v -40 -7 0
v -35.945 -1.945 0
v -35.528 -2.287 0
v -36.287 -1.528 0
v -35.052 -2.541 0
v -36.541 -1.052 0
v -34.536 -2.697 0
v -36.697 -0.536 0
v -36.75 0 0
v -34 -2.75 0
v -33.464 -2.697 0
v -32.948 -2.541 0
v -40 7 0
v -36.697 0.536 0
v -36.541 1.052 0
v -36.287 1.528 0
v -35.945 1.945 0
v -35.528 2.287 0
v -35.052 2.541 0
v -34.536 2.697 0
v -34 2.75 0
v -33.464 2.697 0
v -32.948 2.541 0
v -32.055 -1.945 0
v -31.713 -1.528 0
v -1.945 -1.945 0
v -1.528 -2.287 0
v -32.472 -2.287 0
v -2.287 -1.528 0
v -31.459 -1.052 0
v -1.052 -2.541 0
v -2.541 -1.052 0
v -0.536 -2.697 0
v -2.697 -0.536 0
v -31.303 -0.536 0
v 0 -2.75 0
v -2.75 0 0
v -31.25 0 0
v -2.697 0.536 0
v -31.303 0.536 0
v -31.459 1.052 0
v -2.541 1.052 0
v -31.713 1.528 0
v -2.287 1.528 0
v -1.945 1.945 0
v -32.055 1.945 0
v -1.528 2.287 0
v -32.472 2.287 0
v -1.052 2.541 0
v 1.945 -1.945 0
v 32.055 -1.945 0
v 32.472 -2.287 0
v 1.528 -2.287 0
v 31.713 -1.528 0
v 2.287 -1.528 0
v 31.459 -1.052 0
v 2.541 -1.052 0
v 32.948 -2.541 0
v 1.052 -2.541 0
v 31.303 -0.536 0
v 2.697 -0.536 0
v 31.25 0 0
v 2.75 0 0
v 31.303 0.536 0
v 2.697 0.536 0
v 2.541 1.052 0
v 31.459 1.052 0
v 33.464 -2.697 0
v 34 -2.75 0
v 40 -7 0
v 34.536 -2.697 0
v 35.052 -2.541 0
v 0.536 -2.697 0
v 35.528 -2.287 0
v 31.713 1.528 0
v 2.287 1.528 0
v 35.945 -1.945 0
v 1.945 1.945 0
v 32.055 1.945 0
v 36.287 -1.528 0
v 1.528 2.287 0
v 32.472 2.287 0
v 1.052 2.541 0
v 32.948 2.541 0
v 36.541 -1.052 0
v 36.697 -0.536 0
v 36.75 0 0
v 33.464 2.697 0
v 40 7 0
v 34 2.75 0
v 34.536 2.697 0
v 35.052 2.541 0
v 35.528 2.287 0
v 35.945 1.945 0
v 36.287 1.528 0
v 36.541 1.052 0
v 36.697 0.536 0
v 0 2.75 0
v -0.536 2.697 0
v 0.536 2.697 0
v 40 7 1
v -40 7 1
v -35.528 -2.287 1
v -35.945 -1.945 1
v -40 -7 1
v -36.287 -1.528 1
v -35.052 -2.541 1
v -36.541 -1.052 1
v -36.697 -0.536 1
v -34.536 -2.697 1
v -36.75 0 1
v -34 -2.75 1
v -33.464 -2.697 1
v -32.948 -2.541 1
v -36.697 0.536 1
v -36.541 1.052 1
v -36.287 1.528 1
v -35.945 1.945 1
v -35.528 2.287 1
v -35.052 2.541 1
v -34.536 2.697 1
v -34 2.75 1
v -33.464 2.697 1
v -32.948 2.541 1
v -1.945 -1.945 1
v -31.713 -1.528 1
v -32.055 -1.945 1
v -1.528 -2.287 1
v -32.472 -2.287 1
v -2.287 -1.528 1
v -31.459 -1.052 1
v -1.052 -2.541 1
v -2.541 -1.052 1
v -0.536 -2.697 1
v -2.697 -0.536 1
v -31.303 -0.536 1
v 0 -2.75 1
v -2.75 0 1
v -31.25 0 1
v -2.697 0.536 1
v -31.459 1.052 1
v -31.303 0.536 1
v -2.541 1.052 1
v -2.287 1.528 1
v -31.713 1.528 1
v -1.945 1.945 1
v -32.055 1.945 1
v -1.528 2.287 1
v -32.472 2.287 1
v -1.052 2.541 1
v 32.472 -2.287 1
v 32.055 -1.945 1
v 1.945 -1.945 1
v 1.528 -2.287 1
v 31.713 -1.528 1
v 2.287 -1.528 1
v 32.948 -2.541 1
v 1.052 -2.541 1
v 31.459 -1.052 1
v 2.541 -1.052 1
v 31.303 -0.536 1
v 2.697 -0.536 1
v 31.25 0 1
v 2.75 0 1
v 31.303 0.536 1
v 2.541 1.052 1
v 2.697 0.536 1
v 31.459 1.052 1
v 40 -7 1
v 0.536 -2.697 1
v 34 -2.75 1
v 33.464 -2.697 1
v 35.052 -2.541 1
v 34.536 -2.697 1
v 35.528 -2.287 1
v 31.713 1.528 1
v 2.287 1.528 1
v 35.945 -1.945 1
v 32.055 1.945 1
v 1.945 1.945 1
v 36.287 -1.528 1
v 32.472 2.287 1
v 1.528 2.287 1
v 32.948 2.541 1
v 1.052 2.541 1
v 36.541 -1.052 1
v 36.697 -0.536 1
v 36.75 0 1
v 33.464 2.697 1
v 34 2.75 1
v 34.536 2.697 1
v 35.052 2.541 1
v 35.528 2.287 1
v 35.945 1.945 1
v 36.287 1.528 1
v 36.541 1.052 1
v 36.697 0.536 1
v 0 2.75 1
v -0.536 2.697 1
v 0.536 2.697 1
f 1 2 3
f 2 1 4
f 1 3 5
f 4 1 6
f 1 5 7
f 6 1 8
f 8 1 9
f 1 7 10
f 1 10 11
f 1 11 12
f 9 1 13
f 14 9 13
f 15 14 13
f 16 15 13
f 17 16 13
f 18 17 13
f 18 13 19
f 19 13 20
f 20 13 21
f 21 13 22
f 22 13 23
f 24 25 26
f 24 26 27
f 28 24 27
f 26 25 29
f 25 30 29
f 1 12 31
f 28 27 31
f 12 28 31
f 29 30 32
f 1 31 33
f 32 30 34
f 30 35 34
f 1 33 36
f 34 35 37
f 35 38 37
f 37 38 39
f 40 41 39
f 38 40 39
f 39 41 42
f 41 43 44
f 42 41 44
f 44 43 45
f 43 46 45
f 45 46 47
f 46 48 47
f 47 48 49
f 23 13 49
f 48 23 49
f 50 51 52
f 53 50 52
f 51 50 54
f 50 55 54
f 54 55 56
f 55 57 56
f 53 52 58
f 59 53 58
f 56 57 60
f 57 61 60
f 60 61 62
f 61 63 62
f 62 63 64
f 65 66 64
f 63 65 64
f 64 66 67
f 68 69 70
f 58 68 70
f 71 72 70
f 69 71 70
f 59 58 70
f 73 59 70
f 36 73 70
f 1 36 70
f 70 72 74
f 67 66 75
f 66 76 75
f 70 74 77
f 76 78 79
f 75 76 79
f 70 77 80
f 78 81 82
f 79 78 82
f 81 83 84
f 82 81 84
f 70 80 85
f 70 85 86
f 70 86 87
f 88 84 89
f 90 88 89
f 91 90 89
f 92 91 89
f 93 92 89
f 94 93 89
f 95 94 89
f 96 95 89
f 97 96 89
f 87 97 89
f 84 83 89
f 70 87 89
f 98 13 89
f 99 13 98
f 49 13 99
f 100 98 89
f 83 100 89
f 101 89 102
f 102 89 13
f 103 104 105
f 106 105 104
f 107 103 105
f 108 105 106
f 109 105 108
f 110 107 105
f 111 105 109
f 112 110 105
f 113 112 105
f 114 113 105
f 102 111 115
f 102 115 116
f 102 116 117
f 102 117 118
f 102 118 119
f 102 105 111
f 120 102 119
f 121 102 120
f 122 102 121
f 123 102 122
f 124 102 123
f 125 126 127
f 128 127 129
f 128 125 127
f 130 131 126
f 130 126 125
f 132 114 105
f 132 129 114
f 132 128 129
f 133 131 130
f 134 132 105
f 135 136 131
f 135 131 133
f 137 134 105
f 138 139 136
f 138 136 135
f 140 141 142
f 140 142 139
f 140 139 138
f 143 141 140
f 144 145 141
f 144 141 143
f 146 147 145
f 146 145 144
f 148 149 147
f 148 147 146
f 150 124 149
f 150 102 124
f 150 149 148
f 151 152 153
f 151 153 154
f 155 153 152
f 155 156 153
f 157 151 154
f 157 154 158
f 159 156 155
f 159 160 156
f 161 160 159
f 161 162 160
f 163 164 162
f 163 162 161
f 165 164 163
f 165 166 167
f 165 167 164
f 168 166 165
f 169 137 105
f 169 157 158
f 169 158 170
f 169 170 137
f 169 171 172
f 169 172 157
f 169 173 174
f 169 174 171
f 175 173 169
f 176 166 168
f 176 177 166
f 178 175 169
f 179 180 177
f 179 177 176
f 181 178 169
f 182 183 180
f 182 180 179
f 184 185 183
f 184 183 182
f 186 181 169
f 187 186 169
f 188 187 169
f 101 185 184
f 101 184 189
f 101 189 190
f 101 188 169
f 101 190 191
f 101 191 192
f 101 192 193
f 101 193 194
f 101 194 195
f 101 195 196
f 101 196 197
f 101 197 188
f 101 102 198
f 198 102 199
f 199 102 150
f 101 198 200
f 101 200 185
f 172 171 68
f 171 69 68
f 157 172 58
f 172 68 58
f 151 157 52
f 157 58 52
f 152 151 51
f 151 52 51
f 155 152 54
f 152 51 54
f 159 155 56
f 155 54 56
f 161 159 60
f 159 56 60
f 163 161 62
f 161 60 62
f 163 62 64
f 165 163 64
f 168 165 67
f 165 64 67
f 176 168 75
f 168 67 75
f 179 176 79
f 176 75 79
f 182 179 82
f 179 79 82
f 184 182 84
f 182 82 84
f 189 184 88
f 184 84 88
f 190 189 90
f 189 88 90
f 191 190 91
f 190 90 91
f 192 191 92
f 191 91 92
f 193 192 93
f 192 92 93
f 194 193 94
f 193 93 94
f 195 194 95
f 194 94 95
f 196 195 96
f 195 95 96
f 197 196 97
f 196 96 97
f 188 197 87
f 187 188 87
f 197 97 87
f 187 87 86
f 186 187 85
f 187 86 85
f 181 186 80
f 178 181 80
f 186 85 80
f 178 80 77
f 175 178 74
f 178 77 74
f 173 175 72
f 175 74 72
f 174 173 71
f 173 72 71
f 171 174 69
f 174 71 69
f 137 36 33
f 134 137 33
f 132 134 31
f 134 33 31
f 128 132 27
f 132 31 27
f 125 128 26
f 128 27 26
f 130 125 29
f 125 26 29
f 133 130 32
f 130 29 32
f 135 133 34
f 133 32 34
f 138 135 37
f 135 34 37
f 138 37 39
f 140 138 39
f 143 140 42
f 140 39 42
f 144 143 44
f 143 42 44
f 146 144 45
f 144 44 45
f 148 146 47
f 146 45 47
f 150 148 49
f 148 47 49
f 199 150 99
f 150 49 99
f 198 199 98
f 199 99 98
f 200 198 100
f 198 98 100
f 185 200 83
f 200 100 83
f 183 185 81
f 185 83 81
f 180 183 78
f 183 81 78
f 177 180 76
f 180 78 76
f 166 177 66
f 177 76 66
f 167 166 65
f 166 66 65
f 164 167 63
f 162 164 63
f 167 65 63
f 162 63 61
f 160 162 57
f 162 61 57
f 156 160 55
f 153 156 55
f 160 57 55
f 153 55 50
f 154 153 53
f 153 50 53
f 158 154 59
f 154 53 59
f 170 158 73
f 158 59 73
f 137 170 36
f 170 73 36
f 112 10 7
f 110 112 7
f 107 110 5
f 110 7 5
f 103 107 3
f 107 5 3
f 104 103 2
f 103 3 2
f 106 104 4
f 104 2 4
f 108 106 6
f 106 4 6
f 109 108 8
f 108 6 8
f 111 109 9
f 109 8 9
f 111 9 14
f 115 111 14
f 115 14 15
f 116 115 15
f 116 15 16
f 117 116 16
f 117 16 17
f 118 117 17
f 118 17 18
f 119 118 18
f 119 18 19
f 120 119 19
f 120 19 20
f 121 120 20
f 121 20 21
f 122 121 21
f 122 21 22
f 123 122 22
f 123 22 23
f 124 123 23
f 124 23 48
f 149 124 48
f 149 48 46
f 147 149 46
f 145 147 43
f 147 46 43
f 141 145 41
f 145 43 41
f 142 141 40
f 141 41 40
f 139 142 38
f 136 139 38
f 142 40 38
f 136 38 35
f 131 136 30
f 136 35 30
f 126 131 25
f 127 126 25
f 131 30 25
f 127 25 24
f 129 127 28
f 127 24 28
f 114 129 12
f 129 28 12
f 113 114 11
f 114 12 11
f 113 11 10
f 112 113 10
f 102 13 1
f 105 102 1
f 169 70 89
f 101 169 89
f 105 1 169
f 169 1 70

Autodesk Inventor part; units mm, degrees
ref_plane "YZ Plane" through (0, 0, 0) normal (1, 0, 0) x (0, 1, 0)
ref_plane "XZ Plane" through (0, 0, 0) normal (0, 1, 0) x (-1, 0, 0)
ref_plane "XY Plane" through (0, 0, 0) normal (0, 0, 1) x (1, 0, 0)
sketch "Sketch1" plane through (0, 0, 0) normal (0, 0, 1) x (1, 0, 0)
  line L0 (-40, -7) -> (40, -7)
  line L1 (40, -7) -> (40, 7)
  line L2 (40, 7) -> (-40, 7)
  line L3 (-40, 7) -> (-40, -7)
  line L4 (-40, -7) -> (40, 7) construction
  line L5 (40, -7) -> (-40, 7) construction
  point P0 (0, 0)
  dimension "d0" = 80
  dimension "d1" = 14
extrude "Extrusion1" add sketch "Sketch1" along normal blind 1
sketch "Sketch2" plane through (0, 0, 1) normal (0, 0, 1) x (1, 0, 0)
  point P0 (0, 0)
  point P1 (0, 0)
hole "Hole1" at (0, 0, 1) direction (0, 0, -1) diameter 5.5 depth 8 tip angle 118 clearance for "Countersunk Flat Head Screw DIN EN ISO 2009" size "M5" standard "DIN"
sketch "Sketch3" plane through (0, 0, 1) normal (0, 0, 1) x (1, 0, 0)
  line L0 (-34, 0) -> (34, 0) construction
  point P0 (0, 0)
  point P1 (0, 0)
  dimension "d11" = 68
hole "Hole2" at (-34, 0, 1) at (34, 0, 1) direction (0, 0, -1) diameter 5.5 depth 8 tip angle 118 clearance for "Countersunk Flat Head Screw DIN EN ISO 2009" size "M5" standard "DIN"
properties part number "Cu_Cap" material "Copper"
